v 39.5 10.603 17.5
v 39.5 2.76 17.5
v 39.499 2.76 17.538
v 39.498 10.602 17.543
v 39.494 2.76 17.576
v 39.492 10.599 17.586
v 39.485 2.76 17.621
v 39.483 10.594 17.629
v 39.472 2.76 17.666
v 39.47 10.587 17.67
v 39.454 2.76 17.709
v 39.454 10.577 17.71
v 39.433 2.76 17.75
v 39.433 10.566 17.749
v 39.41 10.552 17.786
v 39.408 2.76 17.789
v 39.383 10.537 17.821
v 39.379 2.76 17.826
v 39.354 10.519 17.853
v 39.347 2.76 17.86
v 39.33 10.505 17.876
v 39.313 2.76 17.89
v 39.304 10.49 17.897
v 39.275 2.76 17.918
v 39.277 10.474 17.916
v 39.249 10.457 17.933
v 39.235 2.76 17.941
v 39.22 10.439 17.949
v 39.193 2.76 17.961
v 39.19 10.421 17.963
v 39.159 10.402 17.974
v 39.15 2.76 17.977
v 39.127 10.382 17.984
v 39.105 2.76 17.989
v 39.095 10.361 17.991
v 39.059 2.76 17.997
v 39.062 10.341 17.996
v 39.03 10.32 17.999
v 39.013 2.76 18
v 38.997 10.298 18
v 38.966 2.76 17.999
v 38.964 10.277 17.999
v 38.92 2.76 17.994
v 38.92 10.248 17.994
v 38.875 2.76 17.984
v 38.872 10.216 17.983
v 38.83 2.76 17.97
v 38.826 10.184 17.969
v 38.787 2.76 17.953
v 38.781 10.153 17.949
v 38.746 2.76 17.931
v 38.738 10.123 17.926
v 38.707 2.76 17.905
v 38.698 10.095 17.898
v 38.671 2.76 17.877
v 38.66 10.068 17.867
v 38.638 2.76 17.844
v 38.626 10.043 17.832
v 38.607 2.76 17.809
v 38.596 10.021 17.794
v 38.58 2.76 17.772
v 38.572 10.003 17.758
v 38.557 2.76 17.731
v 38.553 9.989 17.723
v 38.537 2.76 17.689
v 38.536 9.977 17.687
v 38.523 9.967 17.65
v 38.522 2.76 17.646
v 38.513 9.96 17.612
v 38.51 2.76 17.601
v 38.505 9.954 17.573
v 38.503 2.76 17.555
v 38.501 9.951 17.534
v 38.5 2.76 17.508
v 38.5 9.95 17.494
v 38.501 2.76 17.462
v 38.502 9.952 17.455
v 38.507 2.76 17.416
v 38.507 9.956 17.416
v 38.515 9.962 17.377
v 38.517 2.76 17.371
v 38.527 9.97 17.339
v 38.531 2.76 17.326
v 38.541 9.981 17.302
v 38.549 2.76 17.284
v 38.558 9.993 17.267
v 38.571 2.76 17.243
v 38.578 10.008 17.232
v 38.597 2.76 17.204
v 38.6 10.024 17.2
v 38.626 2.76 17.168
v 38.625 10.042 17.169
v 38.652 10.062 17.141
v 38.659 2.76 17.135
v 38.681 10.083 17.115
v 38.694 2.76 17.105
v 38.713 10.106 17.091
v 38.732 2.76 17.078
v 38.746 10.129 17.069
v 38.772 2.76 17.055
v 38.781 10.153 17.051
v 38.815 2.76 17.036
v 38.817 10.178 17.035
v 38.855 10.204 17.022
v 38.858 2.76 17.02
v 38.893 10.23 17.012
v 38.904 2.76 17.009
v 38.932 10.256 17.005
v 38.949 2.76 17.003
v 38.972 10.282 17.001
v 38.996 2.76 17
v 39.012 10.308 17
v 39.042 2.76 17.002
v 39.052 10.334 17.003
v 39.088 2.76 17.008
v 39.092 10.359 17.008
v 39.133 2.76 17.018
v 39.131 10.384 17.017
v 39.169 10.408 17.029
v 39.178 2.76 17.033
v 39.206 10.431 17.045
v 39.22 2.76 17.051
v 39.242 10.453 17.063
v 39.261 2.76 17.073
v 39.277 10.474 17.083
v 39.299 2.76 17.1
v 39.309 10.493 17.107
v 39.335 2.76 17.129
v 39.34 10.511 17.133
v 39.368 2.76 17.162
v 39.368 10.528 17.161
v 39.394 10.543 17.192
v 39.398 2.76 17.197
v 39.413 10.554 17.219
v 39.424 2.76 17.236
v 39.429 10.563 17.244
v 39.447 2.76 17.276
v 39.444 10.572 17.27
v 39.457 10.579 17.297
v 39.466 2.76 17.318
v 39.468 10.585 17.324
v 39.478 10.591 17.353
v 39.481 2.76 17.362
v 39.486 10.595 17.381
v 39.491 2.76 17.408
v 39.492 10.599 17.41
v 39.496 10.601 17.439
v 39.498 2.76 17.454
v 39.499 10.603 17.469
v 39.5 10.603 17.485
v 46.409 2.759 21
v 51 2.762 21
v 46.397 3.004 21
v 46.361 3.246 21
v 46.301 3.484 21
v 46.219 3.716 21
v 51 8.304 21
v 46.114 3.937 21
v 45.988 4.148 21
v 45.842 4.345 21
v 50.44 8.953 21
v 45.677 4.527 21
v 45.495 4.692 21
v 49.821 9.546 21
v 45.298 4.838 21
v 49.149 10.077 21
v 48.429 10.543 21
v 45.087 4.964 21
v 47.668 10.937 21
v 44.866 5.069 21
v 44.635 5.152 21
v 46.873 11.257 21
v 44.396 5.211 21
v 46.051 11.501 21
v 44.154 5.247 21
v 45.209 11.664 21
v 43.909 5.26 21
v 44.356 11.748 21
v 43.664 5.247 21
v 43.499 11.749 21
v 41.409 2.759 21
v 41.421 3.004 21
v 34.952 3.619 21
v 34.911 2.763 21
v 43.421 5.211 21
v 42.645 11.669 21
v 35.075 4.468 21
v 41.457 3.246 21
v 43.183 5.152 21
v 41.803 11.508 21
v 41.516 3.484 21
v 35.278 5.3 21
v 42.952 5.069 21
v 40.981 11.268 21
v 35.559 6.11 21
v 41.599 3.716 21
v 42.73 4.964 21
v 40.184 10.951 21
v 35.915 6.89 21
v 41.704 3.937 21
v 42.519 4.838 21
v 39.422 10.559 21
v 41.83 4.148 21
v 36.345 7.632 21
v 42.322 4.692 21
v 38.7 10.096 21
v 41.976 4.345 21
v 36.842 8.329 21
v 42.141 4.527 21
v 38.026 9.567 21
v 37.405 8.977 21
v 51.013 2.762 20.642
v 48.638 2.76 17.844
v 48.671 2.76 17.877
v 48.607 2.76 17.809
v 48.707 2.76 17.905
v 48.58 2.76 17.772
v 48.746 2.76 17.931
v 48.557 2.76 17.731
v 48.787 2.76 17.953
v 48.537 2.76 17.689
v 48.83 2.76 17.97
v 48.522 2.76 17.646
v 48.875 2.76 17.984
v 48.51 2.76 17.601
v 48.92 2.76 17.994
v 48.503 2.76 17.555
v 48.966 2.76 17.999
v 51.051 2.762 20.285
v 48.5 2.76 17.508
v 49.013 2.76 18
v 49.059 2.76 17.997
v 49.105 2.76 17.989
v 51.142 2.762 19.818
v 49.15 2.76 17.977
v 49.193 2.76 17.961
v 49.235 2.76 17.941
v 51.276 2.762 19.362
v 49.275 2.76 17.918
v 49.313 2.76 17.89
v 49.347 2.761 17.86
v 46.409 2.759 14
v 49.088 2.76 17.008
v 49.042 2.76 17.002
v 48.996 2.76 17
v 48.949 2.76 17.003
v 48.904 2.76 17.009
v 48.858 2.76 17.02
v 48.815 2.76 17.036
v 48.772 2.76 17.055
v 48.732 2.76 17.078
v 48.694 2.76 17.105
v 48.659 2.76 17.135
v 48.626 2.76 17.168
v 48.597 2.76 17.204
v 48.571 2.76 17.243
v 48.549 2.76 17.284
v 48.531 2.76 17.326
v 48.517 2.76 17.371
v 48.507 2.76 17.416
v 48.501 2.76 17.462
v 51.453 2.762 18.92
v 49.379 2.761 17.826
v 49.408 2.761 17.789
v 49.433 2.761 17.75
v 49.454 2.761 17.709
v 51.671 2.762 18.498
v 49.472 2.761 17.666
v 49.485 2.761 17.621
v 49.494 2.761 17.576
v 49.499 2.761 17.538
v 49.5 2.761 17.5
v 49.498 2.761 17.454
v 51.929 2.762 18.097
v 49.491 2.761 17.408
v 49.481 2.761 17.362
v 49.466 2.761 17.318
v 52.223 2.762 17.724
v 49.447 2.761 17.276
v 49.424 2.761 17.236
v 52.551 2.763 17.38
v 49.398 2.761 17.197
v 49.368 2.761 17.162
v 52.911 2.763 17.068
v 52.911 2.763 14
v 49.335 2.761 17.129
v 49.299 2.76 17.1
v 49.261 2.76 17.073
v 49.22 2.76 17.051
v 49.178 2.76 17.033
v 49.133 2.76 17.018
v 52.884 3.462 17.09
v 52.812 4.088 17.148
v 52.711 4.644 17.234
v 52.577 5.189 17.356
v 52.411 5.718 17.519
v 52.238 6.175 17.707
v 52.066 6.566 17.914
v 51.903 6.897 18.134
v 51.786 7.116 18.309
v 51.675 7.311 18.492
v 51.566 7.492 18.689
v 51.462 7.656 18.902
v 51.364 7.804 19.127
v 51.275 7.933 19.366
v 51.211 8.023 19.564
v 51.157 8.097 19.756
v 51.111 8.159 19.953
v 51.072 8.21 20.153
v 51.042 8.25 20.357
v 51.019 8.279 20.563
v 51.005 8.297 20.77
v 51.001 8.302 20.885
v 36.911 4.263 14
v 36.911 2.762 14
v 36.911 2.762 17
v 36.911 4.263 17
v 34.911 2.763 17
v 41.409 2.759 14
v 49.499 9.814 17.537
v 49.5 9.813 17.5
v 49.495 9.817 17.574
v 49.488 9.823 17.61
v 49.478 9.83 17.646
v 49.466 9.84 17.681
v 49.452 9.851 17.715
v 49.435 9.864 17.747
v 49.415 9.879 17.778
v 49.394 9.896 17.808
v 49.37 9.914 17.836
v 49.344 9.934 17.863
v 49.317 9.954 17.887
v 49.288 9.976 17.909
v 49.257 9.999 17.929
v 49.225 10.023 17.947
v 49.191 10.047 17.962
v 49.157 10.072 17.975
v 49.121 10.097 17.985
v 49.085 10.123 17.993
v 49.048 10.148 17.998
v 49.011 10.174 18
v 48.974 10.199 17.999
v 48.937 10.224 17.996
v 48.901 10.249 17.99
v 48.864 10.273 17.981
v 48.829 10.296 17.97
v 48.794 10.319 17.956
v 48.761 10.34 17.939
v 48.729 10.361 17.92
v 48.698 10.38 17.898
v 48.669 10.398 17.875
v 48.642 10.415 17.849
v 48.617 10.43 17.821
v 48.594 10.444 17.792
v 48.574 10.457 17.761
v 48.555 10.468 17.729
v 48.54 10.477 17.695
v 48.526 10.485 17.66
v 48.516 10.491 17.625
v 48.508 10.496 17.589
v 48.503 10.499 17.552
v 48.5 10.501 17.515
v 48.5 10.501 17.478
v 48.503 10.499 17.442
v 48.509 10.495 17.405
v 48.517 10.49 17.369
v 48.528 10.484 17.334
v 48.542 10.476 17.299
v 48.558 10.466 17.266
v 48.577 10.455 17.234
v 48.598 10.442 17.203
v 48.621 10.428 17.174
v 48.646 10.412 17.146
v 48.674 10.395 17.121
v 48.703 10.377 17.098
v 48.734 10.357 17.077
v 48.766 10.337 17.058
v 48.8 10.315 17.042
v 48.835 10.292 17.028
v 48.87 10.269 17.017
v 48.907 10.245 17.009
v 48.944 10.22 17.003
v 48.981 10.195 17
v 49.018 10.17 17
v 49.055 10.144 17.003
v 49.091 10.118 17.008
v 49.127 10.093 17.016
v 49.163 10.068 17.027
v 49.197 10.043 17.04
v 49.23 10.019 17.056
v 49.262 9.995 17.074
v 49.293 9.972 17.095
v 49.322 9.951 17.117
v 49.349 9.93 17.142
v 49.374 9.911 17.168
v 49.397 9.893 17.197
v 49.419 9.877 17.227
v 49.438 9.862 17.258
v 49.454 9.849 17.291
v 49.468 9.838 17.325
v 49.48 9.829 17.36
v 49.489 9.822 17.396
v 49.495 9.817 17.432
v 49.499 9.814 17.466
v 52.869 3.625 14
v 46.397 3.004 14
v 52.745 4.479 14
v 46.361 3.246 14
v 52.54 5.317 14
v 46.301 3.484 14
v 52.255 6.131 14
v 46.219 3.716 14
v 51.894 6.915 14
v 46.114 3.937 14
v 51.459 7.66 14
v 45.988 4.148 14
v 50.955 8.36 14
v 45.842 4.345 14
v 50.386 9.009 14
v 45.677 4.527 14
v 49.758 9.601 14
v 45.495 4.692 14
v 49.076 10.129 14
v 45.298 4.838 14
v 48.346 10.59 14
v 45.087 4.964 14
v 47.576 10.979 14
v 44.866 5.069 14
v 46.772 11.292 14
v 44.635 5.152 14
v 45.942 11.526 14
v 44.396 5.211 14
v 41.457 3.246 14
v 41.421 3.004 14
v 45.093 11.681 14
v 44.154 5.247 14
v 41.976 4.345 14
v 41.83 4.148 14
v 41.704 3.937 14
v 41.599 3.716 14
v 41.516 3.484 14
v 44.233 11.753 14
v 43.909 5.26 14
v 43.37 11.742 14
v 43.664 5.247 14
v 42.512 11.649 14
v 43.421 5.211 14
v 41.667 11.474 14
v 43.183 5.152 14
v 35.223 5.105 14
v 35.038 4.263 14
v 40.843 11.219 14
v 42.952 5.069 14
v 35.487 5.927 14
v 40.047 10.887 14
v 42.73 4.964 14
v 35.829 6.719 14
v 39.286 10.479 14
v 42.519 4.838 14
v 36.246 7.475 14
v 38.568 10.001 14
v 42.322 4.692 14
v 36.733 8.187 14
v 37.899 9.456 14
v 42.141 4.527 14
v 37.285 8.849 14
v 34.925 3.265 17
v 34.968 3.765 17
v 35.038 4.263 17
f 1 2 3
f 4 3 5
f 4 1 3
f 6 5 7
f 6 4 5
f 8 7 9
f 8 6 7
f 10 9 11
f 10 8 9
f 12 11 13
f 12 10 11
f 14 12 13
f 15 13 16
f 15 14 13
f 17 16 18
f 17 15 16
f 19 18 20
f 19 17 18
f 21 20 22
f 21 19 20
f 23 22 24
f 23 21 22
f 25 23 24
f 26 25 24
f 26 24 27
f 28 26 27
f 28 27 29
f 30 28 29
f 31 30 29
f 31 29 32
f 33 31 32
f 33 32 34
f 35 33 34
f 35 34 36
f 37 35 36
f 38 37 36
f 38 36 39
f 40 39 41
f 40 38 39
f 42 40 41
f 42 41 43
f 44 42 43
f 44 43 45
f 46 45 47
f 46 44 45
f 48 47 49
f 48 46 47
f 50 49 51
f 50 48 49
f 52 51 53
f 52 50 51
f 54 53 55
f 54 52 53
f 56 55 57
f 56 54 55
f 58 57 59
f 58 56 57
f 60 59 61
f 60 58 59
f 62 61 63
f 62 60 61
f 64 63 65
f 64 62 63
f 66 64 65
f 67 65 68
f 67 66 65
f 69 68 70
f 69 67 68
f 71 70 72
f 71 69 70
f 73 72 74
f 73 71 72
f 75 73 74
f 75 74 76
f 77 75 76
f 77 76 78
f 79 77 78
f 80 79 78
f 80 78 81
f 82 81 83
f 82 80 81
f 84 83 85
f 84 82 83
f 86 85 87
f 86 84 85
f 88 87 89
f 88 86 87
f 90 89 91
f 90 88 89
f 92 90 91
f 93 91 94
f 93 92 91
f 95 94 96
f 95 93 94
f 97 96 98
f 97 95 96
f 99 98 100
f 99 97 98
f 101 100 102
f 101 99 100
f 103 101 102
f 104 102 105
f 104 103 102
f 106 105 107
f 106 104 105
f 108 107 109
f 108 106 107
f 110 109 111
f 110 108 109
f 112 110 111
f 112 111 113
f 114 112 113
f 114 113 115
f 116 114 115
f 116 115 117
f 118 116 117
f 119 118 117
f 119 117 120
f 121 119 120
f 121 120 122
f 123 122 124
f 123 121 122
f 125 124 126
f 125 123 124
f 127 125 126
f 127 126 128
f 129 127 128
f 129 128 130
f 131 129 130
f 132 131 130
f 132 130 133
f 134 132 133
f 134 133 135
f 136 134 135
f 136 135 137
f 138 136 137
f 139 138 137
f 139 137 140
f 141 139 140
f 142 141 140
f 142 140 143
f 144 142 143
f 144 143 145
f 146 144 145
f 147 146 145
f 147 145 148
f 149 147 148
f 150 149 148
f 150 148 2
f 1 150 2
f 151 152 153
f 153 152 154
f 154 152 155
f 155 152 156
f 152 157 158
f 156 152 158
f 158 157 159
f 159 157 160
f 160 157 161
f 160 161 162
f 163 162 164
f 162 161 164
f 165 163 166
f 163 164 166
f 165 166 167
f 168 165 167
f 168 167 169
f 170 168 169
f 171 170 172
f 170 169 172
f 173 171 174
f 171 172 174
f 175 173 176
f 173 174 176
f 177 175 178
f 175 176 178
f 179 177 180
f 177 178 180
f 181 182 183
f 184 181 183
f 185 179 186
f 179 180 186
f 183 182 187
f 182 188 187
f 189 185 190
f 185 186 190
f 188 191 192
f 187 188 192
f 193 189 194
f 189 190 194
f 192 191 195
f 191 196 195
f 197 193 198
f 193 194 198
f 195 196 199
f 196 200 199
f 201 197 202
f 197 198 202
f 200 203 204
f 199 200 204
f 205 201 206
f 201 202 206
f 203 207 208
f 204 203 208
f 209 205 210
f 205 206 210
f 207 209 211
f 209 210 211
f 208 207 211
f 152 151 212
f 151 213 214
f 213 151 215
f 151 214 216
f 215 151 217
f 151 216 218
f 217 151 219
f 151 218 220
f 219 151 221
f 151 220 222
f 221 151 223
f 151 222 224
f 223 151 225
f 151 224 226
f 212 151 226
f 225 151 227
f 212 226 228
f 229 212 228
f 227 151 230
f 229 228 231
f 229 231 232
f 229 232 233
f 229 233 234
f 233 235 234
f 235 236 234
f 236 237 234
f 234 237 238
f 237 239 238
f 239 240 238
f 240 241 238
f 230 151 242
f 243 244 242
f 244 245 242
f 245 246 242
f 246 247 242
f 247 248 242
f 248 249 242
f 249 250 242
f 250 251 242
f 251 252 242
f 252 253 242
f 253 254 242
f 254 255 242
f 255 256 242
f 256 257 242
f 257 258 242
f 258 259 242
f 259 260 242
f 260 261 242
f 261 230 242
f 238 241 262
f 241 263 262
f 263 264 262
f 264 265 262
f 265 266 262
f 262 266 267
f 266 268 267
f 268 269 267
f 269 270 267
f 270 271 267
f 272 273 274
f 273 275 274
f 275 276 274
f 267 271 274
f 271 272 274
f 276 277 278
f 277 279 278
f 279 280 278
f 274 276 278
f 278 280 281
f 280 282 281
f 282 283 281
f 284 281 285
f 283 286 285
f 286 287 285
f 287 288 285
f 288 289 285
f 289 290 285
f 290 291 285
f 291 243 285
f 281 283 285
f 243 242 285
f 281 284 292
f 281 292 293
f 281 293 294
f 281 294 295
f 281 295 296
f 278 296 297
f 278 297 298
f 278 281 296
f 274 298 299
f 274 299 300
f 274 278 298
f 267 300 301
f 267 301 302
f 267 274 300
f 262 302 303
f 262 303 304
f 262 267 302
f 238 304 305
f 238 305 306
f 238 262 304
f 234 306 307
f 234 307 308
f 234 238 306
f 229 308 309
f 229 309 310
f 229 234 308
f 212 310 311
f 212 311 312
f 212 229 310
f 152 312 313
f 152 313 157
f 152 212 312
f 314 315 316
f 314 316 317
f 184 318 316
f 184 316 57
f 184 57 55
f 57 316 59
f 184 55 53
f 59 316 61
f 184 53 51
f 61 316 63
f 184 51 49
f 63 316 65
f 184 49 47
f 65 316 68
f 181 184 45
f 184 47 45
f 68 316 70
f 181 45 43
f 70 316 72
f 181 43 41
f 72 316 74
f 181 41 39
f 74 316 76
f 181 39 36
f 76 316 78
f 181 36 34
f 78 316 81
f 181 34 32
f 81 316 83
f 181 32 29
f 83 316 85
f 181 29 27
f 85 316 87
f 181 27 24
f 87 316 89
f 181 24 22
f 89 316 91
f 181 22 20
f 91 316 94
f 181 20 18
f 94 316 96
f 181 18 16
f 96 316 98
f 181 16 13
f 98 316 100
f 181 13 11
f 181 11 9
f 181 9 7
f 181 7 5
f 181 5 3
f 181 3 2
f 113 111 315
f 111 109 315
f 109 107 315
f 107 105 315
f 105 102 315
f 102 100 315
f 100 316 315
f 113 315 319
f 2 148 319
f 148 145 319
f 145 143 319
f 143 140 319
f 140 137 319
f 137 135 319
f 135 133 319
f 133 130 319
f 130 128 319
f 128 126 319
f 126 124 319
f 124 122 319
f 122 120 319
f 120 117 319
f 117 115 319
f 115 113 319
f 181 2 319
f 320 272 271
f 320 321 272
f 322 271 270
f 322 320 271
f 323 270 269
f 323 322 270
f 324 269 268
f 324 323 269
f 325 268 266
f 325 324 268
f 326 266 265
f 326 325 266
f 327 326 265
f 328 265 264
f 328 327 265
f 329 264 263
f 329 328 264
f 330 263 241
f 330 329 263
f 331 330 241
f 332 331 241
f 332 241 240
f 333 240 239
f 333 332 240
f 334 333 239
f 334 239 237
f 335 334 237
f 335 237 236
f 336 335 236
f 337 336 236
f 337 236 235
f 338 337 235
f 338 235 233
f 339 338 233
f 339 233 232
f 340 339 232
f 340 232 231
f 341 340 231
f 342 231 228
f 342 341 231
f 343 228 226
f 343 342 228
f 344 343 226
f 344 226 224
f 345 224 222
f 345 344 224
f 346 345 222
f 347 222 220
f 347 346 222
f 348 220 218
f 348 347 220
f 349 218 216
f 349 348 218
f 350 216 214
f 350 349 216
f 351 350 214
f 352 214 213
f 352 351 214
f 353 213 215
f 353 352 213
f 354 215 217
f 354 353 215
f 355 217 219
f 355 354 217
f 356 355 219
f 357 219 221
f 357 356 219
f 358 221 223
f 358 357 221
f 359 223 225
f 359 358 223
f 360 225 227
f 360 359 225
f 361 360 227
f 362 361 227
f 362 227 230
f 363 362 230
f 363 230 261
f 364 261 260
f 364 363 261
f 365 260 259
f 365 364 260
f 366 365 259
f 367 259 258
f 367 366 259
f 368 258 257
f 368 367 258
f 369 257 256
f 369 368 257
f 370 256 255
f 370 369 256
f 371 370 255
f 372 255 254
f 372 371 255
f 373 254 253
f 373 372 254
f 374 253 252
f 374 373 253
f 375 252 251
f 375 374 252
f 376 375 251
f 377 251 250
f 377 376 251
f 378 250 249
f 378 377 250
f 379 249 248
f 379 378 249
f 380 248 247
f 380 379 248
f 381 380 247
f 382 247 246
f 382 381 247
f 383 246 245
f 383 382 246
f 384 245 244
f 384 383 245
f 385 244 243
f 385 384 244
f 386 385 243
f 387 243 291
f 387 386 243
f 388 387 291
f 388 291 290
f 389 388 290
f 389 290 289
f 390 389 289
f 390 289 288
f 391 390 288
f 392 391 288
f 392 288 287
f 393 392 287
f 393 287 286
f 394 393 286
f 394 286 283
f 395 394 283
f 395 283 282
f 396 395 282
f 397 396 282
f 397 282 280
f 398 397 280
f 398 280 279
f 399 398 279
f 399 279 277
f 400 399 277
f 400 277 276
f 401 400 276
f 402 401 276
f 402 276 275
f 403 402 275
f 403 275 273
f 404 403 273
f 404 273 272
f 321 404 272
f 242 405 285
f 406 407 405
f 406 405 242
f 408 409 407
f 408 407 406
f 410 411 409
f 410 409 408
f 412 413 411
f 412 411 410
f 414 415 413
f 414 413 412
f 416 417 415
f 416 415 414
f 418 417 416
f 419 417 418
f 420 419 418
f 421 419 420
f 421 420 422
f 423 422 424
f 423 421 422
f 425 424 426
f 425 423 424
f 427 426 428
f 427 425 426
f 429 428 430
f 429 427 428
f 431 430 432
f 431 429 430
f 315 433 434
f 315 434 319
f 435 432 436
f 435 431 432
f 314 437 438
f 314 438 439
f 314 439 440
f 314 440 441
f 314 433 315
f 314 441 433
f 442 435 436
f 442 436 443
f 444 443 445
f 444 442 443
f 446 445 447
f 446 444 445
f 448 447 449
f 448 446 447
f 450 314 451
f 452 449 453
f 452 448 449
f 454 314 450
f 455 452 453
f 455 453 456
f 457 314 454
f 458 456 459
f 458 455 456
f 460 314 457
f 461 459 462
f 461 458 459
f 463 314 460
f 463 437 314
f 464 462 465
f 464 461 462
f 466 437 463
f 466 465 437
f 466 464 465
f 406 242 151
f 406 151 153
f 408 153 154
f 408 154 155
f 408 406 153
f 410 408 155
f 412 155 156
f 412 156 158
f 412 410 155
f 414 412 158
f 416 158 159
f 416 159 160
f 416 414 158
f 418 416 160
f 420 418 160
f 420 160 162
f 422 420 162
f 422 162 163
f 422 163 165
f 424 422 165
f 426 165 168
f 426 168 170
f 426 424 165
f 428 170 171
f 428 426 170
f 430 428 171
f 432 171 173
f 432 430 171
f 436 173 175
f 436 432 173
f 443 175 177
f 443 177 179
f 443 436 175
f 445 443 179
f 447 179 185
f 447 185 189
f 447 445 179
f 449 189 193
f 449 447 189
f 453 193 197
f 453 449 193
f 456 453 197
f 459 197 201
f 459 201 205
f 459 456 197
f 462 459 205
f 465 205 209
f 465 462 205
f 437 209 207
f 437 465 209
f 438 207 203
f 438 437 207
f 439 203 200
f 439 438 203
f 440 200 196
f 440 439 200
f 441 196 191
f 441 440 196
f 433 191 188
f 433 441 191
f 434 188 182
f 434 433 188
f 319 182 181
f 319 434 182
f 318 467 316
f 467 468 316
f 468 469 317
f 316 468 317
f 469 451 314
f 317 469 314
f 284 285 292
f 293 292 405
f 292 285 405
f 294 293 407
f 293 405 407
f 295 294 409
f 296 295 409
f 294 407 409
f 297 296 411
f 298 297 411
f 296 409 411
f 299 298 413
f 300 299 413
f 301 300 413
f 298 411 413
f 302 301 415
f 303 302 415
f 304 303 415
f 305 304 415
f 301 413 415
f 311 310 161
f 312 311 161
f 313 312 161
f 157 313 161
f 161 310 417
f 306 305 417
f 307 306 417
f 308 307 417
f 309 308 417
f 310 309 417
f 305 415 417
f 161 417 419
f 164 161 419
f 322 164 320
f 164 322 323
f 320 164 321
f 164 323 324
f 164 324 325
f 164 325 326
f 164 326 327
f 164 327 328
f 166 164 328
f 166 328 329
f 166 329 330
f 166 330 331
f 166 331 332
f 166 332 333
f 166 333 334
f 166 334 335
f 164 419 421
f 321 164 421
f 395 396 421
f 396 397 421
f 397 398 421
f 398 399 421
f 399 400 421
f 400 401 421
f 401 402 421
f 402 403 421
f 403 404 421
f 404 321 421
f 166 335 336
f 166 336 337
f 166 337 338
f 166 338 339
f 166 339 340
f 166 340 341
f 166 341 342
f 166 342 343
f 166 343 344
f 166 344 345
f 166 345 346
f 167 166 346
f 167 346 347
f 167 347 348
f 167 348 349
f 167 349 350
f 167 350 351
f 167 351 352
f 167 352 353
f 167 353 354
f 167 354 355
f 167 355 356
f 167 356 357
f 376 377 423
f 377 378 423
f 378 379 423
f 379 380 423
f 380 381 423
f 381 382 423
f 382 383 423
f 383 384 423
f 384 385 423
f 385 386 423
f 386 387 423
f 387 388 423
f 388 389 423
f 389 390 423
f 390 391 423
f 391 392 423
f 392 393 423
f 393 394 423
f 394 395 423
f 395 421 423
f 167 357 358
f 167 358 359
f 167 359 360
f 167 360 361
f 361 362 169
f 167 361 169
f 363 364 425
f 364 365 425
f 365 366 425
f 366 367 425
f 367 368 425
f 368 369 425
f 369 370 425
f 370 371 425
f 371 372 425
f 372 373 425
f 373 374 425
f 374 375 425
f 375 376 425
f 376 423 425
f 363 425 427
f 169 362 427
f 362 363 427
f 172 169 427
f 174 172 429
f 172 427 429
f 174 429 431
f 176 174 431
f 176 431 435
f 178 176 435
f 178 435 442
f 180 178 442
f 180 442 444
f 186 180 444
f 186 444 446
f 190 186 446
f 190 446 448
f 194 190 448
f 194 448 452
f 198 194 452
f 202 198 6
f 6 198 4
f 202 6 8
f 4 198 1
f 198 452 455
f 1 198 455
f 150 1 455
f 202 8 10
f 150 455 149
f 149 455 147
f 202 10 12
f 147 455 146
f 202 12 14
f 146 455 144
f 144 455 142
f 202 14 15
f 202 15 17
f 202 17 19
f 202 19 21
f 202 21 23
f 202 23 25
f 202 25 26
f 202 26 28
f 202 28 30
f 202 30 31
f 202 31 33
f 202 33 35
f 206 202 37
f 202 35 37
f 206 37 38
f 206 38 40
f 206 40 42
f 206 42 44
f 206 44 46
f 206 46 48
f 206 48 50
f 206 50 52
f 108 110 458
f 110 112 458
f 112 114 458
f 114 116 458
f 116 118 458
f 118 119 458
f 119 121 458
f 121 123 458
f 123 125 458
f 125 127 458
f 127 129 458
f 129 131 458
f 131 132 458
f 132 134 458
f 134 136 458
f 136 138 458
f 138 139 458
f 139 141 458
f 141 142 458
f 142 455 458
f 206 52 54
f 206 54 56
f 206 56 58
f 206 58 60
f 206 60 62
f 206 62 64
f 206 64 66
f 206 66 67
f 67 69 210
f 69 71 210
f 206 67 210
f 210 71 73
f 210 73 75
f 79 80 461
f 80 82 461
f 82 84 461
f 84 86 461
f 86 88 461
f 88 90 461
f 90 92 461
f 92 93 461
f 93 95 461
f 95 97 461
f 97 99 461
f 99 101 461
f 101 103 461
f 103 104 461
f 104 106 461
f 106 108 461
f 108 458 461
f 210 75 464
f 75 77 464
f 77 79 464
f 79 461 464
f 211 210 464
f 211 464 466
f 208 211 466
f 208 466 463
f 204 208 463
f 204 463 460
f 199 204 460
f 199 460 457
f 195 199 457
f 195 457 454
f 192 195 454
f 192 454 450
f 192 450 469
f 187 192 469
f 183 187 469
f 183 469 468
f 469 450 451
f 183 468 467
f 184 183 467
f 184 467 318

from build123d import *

# Parameters (mm, degrees)
CYLINDER017_R     = 0.5
CYLINDER017_DEPTH = 20
CYLINDER018_R     = 0.5
CYLINDER018_DEPTH = 20
CYLINDER008_R     = 5
CYLINDER008_DEPTH = 13
PAD007_DEPTH      = 7
SKETCH065_W       = 2
SKETCH065_H       = 3
POCKET005_DEPTH   = 3


with BuildPart() as cylinder017:
    # Cylinder017 → Cylinder017 (new body)
    with BuildSketch(Plane(origin=(39, 12, 17.5), x_dir=(1, 0, 0), z_dir=(0, -1, 0))):
        Circle(CYLINDER017_R)
    extrude(amount=CYLINDER017_DEPTH)


with BuildPart() as fusion018:
    # Cylinder018 → Cylinder018 (new body)
    with BuildSketch(Plane(origin=(49, 12, 17.5), x_dir=(1, 0, 0), z_dir=(0, -1, 0))):
        Circle(CYLINDER018_R)
    extrude(amount=CYLINDER018_DEPTH)

    # Fusion018: union Cylinder017
    add(cylinder017.part)


with BuildPart() as cylinder008:
    # Cylinder008 → Cylinder008 (new body)
    with BuildSketch(Plane(origin=(56, -3, 21), x_dir=(1, 0, 0), z_dir=(0, 1, 0))):
        Circle(CYLINDER008_R)
    extrude(amount=CYLINDER008_DEPTH)


with BuildPart() as potclamp:
    # Sketch059 → Pad007 (new body)
    with BuildSketch(Plane.XY):
        with BuildLine():
            ThreePointArc((46.408643, 2.758552), (43.908643, 5.259517), (41.408643, 2.758552))
            Line((34.911109, 2.762902), (41.408643, 2.758552))
            ThreePointArc((52.911107, 2.762902), (43.911108, 11.758552), (34.911109, 2.762902))
            Line((46.408643, 2.758552), (52.911107, 2.762902))
        make_face()
    extrude(amount=PAD007_DEPTH)

    # Sketch065 → Pocket005 (cut)
    with BuildSketch(Plane.XY):
        with Locations((35.911109, 2.762661)):
            Rectangle(SKETCH065_W, SKETCH065_H)
    extrude(amount=POCKET005_DEPTH, mode=Mode.SUBTRACT)


with BuildPart() as potclamp_1:
    # Body007 placement: moved
    add(potclamp.part.moved(Location((0, 0, 14))))

    # Cut005: cut Cylinder008
    add(cylinder008.part, mode=Mode.SUBTRACT)

    # Cut011: cut Fusion018
    add(fusion018.part, mode=Mode.SUBTRACT)


solid = potclamp_1.part
